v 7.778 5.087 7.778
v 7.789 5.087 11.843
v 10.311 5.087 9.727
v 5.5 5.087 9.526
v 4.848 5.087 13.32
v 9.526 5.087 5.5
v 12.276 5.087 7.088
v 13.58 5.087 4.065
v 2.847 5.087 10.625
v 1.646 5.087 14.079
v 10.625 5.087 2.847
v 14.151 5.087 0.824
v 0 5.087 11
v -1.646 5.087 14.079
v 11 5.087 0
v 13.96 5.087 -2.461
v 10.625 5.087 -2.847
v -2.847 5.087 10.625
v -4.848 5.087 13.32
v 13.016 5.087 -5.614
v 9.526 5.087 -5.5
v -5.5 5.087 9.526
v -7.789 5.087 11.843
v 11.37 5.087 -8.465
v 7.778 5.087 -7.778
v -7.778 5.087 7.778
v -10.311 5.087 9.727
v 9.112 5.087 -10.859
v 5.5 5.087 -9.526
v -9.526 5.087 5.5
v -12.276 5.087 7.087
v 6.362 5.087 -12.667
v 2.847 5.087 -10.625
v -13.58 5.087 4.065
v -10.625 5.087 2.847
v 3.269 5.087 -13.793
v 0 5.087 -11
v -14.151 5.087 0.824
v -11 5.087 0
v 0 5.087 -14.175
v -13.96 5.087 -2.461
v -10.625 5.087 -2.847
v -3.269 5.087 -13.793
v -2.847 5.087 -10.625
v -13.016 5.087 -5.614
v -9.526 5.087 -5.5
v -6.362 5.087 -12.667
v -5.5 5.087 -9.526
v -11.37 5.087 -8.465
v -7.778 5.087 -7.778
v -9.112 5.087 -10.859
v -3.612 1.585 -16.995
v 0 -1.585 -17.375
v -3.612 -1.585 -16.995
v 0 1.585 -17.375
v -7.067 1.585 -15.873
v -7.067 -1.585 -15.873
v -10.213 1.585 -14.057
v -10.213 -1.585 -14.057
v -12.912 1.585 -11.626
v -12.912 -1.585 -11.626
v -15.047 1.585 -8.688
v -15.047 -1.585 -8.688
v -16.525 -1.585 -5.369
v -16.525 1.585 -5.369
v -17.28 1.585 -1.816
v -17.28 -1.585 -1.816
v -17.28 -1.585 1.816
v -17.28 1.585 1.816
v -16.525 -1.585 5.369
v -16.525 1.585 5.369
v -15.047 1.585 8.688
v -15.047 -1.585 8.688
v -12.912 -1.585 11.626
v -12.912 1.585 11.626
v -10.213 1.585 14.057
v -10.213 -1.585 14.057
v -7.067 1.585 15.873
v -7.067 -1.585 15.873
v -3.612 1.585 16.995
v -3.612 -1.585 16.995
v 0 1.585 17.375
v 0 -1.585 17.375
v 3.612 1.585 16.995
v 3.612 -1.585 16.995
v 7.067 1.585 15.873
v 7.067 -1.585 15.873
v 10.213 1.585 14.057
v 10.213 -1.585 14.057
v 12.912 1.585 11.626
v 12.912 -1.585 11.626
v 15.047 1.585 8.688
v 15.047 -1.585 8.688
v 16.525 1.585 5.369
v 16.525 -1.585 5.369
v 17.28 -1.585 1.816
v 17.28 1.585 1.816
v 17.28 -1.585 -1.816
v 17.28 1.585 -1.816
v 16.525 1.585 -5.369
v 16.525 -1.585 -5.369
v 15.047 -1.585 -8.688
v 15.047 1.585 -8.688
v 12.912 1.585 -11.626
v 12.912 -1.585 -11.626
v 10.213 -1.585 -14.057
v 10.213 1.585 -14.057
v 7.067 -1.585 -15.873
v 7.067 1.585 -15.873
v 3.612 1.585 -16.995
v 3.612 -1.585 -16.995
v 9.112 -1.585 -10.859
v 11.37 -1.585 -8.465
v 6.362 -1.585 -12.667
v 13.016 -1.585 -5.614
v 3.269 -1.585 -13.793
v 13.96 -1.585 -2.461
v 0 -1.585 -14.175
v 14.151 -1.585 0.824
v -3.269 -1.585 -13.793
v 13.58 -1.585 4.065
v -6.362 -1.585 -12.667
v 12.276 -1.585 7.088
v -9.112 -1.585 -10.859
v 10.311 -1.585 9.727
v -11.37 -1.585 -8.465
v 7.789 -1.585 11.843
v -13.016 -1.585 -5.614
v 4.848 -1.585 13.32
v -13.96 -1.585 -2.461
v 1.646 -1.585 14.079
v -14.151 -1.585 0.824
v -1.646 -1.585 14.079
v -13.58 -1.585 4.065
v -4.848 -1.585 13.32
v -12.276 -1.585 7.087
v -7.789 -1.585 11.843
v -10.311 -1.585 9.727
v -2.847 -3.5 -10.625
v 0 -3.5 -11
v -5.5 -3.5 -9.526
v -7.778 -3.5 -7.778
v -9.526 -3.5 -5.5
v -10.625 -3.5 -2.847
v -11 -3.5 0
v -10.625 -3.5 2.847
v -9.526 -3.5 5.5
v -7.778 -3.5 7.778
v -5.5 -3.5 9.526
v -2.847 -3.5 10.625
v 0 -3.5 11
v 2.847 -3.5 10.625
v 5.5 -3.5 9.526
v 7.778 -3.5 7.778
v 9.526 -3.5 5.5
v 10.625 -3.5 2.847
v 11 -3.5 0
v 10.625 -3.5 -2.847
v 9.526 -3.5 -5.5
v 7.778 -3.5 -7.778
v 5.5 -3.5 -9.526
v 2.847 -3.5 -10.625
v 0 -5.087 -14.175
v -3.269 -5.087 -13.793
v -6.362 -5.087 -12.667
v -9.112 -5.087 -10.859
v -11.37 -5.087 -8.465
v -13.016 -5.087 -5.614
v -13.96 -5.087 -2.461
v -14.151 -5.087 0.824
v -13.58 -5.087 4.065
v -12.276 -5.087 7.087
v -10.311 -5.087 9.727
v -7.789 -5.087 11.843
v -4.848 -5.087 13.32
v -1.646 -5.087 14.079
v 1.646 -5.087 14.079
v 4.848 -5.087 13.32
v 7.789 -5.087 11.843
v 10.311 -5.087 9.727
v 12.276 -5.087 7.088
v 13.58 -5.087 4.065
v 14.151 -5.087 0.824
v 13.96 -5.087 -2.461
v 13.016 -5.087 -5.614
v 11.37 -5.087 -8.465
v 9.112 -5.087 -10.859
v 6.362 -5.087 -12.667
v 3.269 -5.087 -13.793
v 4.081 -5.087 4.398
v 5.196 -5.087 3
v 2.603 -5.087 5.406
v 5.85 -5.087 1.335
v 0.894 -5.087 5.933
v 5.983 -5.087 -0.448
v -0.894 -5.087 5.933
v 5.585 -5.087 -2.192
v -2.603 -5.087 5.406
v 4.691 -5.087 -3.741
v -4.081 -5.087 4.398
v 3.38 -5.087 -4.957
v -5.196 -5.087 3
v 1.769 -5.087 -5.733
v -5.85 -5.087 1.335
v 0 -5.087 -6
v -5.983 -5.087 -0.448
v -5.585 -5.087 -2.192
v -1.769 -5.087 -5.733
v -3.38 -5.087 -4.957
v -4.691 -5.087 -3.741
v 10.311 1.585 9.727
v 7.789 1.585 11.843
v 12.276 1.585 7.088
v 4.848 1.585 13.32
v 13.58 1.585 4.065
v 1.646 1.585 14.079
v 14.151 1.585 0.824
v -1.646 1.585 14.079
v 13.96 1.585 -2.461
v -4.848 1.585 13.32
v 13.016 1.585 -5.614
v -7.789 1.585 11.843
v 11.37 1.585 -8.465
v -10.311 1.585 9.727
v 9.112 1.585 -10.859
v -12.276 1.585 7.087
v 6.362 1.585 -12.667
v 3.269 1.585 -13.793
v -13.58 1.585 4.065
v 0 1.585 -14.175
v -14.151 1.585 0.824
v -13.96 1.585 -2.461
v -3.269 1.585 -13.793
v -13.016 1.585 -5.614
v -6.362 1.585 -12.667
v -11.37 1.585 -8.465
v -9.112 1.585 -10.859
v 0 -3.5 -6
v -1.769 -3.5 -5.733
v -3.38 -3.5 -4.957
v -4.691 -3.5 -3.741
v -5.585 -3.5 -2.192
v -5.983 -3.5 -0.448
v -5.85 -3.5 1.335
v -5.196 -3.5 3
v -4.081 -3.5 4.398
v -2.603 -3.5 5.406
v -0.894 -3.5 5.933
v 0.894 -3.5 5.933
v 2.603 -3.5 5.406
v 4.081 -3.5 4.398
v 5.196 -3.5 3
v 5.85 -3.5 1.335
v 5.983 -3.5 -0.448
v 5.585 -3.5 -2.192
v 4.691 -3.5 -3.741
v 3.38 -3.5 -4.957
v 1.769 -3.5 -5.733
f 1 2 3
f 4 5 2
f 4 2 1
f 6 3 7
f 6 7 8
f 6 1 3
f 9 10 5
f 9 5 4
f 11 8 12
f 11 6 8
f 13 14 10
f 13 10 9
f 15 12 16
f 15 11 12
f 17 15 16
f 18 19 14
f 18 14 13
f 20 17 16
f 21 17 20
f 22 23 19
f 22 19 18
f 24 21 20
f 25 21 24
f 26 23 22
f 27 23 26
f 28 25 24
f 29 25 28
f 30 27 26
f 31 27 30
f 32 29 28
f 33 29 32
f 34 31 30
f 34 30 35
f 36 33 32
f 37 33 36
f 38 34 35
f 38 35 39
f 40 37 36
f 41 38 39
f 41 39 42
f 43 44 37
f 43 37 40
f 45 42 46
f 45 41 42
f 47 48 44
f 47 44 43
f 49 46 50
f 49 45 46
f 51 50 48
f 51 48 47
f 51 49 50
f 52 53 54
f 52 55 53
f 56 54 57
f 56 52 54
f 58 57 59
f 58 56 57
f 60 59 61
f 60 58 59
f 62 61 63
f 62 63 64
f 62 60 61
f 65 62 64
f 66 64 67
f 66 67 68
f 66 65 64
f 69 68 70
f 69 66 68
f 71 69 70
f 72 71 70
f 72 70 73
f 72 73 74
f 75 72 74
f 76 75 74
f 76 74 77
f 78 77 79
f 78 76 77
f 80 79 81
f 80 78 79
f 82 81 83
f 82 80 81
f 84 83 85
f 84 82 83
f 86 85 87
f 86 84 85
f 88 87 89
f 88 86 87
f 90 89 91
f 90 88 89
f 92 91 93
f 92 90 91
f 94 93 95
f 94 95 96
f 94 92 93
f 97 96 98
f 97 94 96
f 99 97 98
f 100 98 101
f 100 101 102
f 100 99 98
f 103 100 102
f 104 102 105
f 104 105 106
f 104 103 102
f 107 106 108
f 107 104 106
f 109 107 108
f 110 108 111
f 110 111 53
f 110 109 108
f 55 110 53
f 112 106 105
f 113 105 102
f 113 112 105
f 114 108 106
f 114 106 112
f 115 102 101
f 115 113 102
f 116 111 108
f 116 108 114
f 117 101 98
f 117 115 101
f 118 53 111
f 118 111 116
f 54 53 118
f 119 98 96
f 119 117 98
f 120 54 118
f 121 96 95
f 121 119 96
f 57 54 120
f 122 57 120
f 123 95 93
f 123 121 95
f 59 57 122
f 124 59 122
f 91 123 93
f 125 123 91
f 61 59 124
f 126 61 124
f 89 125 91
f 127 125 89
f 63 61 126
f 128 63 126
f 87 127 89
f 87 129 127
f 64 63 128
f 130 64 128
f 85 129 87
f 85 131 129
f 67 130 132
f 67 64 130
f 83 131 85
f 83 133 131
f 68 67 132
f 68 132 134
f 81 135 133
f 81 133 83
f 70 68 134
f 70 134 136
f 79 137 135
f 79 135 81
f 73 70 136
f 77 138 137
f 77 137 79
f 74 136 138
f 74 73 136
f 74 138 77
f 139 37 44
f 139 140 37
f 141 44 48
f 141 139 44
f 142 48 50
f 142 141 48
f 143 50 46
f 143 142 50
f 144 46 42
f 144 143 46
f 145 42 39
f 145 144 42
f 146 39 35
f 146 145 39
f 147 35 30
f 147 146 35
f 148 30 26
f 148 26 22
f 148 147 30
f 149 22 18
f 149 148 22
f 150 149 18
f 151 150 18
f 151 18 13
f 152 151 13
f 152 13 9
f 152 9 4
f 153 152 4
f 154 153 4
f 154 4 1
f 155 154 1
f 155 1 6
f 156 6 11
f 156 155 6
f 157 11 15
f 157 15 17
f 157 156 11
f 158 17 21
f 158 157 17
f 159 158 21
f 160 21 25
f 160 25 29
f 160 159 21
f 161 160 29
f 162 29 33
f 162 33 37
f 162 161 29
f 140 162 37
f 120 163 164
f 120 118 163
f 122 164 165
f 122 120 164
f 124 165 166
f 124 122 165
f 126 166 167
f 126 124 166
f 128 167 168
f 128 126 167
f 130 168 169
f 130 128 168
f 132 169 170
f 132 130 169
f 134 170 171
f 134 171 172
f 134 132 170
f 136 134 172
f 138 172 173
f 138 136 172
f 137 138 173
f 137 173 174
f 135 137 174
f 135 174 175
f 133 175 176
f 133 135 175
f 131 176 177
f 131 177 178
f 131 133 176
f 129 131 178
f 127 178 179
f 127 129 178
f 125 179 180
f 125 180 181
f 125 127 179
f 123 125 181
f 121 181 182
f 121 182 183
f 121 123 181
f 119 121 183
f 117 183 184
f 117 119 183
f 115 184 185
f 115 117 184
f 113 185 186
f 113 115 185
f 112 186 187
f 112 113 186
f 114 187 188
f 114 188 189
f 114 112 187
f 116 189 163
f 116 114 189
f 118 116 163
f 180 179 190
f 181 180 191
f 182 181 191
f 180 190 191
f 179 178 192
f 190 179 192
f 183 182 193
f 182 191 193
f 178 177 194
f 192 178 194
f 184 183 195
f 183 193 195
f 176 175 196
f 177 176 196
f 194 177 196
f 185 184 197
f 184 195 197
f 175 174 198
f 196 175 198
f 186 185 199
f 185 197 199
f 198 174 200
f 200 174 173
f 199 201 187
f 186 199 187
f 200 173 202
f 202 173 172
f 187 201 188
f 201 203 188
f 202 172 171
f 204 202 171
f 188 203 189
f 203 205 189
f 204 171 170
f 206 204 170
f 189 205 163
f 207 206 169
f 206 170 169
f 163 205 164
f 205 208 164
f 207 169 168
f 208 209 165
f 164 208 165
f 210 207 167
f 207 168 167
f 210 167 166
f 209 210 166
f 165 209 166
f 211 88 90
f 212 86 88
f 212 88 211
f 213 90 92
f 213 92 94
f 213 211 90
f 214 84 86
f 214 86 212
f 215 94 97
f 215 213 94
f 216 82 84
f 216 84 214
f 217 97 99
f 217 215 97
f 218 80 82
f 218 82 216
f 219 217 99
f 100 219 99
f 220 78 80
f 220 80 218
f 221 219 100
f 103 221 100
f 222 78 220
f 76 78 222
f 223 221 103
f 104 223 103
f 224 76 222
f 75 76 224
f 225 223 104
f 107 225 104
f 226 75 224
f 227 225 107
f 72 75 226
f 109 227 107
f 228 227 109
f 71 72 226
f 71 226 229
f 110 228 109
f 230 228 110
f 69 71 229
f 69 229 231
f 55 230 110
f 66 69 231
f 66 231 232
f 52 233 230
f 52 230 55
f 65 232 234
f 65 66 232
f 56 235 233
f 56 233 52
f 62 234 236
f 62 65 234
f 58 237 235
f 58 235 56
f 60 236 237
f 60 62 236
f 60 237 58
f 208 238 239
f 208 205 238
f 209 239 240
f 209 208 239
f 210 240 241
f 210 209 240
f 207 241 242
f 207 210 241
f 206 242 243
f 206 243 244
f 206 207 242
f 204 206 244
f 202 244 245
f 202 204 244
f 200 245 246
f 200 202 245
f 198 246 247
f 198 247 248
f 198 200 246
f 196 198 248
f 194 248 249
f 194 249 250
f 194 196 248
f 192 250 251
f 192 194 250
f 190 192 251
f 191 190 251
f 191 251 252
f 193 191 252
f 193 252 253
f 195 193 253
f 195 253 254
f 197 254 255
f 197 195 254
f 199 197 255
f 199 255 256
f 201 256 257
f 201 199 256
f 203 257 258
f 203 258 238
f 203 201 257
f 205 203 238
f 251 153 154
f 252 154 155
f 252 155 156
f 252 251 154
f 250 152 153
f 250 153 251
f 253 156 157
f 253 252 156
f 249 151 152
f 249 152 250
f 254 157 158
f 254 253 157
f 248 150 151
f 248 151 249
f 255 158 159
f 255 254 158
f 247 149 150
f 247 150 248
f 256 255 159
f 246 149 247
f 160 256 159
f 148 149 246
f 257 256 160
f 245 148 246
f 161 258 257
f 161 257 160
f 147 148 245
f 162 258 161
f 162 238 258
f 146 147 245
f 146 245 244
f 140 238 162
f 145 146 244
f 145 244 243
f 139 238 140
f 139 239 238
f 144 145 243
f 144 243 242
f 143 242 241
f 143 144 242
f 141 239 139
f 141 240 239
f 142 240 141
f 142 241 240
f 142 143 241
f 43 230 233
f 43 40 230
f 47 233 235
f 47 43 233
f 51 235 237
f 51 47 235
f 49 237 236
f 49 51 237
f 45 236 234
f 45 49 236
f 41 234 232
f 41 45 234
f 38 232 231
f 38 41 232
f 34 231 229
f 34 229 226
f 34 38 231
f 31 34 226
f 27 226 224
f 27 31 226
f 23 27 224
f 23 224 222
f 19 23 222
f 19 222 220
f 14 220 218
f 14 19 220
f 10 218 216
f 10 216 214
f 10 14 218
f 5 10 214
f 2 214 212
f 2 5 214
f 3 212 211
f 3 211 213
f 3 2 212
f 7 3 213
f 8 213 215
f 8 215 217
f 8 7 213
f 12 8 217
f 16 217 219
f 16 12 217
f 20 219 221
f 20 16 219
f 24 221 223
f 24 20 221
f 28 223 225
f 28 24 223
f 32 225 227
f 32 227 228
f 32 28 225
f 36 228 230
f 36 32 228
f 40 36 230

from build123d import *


with BuildPart() as part:
    # Profile Sketch → Profile Revolve (revolve)
    with BuildSketch(Plane(origin=(0, 0, 0), x_dir=(0, 0, -1), z_dir=(1, 0, 0)), mode=Mode.PRIVATE) as profile_revolve_sk:
        Polygon((-6, -3.499999985), (-6, -5.087499985), (-11, -5.087499985), (-14.175, -5.087499985), (-14.175, -1.585), (-17.375, -1.585), (-17.375, 1.585), (-14.175, 1.585), (-14.175, 5.087499985), (-11, 5.087499985), (-11, -3.499999985), align=None)
    revolve(profile_revolve_sk.sketch.rotate(Axis((0, -5.087499985, 0), (0, 1, 0)), 180), axis=Axis((0, -5.087499985, 0), (0, 1, 0)))


solid = part.part
